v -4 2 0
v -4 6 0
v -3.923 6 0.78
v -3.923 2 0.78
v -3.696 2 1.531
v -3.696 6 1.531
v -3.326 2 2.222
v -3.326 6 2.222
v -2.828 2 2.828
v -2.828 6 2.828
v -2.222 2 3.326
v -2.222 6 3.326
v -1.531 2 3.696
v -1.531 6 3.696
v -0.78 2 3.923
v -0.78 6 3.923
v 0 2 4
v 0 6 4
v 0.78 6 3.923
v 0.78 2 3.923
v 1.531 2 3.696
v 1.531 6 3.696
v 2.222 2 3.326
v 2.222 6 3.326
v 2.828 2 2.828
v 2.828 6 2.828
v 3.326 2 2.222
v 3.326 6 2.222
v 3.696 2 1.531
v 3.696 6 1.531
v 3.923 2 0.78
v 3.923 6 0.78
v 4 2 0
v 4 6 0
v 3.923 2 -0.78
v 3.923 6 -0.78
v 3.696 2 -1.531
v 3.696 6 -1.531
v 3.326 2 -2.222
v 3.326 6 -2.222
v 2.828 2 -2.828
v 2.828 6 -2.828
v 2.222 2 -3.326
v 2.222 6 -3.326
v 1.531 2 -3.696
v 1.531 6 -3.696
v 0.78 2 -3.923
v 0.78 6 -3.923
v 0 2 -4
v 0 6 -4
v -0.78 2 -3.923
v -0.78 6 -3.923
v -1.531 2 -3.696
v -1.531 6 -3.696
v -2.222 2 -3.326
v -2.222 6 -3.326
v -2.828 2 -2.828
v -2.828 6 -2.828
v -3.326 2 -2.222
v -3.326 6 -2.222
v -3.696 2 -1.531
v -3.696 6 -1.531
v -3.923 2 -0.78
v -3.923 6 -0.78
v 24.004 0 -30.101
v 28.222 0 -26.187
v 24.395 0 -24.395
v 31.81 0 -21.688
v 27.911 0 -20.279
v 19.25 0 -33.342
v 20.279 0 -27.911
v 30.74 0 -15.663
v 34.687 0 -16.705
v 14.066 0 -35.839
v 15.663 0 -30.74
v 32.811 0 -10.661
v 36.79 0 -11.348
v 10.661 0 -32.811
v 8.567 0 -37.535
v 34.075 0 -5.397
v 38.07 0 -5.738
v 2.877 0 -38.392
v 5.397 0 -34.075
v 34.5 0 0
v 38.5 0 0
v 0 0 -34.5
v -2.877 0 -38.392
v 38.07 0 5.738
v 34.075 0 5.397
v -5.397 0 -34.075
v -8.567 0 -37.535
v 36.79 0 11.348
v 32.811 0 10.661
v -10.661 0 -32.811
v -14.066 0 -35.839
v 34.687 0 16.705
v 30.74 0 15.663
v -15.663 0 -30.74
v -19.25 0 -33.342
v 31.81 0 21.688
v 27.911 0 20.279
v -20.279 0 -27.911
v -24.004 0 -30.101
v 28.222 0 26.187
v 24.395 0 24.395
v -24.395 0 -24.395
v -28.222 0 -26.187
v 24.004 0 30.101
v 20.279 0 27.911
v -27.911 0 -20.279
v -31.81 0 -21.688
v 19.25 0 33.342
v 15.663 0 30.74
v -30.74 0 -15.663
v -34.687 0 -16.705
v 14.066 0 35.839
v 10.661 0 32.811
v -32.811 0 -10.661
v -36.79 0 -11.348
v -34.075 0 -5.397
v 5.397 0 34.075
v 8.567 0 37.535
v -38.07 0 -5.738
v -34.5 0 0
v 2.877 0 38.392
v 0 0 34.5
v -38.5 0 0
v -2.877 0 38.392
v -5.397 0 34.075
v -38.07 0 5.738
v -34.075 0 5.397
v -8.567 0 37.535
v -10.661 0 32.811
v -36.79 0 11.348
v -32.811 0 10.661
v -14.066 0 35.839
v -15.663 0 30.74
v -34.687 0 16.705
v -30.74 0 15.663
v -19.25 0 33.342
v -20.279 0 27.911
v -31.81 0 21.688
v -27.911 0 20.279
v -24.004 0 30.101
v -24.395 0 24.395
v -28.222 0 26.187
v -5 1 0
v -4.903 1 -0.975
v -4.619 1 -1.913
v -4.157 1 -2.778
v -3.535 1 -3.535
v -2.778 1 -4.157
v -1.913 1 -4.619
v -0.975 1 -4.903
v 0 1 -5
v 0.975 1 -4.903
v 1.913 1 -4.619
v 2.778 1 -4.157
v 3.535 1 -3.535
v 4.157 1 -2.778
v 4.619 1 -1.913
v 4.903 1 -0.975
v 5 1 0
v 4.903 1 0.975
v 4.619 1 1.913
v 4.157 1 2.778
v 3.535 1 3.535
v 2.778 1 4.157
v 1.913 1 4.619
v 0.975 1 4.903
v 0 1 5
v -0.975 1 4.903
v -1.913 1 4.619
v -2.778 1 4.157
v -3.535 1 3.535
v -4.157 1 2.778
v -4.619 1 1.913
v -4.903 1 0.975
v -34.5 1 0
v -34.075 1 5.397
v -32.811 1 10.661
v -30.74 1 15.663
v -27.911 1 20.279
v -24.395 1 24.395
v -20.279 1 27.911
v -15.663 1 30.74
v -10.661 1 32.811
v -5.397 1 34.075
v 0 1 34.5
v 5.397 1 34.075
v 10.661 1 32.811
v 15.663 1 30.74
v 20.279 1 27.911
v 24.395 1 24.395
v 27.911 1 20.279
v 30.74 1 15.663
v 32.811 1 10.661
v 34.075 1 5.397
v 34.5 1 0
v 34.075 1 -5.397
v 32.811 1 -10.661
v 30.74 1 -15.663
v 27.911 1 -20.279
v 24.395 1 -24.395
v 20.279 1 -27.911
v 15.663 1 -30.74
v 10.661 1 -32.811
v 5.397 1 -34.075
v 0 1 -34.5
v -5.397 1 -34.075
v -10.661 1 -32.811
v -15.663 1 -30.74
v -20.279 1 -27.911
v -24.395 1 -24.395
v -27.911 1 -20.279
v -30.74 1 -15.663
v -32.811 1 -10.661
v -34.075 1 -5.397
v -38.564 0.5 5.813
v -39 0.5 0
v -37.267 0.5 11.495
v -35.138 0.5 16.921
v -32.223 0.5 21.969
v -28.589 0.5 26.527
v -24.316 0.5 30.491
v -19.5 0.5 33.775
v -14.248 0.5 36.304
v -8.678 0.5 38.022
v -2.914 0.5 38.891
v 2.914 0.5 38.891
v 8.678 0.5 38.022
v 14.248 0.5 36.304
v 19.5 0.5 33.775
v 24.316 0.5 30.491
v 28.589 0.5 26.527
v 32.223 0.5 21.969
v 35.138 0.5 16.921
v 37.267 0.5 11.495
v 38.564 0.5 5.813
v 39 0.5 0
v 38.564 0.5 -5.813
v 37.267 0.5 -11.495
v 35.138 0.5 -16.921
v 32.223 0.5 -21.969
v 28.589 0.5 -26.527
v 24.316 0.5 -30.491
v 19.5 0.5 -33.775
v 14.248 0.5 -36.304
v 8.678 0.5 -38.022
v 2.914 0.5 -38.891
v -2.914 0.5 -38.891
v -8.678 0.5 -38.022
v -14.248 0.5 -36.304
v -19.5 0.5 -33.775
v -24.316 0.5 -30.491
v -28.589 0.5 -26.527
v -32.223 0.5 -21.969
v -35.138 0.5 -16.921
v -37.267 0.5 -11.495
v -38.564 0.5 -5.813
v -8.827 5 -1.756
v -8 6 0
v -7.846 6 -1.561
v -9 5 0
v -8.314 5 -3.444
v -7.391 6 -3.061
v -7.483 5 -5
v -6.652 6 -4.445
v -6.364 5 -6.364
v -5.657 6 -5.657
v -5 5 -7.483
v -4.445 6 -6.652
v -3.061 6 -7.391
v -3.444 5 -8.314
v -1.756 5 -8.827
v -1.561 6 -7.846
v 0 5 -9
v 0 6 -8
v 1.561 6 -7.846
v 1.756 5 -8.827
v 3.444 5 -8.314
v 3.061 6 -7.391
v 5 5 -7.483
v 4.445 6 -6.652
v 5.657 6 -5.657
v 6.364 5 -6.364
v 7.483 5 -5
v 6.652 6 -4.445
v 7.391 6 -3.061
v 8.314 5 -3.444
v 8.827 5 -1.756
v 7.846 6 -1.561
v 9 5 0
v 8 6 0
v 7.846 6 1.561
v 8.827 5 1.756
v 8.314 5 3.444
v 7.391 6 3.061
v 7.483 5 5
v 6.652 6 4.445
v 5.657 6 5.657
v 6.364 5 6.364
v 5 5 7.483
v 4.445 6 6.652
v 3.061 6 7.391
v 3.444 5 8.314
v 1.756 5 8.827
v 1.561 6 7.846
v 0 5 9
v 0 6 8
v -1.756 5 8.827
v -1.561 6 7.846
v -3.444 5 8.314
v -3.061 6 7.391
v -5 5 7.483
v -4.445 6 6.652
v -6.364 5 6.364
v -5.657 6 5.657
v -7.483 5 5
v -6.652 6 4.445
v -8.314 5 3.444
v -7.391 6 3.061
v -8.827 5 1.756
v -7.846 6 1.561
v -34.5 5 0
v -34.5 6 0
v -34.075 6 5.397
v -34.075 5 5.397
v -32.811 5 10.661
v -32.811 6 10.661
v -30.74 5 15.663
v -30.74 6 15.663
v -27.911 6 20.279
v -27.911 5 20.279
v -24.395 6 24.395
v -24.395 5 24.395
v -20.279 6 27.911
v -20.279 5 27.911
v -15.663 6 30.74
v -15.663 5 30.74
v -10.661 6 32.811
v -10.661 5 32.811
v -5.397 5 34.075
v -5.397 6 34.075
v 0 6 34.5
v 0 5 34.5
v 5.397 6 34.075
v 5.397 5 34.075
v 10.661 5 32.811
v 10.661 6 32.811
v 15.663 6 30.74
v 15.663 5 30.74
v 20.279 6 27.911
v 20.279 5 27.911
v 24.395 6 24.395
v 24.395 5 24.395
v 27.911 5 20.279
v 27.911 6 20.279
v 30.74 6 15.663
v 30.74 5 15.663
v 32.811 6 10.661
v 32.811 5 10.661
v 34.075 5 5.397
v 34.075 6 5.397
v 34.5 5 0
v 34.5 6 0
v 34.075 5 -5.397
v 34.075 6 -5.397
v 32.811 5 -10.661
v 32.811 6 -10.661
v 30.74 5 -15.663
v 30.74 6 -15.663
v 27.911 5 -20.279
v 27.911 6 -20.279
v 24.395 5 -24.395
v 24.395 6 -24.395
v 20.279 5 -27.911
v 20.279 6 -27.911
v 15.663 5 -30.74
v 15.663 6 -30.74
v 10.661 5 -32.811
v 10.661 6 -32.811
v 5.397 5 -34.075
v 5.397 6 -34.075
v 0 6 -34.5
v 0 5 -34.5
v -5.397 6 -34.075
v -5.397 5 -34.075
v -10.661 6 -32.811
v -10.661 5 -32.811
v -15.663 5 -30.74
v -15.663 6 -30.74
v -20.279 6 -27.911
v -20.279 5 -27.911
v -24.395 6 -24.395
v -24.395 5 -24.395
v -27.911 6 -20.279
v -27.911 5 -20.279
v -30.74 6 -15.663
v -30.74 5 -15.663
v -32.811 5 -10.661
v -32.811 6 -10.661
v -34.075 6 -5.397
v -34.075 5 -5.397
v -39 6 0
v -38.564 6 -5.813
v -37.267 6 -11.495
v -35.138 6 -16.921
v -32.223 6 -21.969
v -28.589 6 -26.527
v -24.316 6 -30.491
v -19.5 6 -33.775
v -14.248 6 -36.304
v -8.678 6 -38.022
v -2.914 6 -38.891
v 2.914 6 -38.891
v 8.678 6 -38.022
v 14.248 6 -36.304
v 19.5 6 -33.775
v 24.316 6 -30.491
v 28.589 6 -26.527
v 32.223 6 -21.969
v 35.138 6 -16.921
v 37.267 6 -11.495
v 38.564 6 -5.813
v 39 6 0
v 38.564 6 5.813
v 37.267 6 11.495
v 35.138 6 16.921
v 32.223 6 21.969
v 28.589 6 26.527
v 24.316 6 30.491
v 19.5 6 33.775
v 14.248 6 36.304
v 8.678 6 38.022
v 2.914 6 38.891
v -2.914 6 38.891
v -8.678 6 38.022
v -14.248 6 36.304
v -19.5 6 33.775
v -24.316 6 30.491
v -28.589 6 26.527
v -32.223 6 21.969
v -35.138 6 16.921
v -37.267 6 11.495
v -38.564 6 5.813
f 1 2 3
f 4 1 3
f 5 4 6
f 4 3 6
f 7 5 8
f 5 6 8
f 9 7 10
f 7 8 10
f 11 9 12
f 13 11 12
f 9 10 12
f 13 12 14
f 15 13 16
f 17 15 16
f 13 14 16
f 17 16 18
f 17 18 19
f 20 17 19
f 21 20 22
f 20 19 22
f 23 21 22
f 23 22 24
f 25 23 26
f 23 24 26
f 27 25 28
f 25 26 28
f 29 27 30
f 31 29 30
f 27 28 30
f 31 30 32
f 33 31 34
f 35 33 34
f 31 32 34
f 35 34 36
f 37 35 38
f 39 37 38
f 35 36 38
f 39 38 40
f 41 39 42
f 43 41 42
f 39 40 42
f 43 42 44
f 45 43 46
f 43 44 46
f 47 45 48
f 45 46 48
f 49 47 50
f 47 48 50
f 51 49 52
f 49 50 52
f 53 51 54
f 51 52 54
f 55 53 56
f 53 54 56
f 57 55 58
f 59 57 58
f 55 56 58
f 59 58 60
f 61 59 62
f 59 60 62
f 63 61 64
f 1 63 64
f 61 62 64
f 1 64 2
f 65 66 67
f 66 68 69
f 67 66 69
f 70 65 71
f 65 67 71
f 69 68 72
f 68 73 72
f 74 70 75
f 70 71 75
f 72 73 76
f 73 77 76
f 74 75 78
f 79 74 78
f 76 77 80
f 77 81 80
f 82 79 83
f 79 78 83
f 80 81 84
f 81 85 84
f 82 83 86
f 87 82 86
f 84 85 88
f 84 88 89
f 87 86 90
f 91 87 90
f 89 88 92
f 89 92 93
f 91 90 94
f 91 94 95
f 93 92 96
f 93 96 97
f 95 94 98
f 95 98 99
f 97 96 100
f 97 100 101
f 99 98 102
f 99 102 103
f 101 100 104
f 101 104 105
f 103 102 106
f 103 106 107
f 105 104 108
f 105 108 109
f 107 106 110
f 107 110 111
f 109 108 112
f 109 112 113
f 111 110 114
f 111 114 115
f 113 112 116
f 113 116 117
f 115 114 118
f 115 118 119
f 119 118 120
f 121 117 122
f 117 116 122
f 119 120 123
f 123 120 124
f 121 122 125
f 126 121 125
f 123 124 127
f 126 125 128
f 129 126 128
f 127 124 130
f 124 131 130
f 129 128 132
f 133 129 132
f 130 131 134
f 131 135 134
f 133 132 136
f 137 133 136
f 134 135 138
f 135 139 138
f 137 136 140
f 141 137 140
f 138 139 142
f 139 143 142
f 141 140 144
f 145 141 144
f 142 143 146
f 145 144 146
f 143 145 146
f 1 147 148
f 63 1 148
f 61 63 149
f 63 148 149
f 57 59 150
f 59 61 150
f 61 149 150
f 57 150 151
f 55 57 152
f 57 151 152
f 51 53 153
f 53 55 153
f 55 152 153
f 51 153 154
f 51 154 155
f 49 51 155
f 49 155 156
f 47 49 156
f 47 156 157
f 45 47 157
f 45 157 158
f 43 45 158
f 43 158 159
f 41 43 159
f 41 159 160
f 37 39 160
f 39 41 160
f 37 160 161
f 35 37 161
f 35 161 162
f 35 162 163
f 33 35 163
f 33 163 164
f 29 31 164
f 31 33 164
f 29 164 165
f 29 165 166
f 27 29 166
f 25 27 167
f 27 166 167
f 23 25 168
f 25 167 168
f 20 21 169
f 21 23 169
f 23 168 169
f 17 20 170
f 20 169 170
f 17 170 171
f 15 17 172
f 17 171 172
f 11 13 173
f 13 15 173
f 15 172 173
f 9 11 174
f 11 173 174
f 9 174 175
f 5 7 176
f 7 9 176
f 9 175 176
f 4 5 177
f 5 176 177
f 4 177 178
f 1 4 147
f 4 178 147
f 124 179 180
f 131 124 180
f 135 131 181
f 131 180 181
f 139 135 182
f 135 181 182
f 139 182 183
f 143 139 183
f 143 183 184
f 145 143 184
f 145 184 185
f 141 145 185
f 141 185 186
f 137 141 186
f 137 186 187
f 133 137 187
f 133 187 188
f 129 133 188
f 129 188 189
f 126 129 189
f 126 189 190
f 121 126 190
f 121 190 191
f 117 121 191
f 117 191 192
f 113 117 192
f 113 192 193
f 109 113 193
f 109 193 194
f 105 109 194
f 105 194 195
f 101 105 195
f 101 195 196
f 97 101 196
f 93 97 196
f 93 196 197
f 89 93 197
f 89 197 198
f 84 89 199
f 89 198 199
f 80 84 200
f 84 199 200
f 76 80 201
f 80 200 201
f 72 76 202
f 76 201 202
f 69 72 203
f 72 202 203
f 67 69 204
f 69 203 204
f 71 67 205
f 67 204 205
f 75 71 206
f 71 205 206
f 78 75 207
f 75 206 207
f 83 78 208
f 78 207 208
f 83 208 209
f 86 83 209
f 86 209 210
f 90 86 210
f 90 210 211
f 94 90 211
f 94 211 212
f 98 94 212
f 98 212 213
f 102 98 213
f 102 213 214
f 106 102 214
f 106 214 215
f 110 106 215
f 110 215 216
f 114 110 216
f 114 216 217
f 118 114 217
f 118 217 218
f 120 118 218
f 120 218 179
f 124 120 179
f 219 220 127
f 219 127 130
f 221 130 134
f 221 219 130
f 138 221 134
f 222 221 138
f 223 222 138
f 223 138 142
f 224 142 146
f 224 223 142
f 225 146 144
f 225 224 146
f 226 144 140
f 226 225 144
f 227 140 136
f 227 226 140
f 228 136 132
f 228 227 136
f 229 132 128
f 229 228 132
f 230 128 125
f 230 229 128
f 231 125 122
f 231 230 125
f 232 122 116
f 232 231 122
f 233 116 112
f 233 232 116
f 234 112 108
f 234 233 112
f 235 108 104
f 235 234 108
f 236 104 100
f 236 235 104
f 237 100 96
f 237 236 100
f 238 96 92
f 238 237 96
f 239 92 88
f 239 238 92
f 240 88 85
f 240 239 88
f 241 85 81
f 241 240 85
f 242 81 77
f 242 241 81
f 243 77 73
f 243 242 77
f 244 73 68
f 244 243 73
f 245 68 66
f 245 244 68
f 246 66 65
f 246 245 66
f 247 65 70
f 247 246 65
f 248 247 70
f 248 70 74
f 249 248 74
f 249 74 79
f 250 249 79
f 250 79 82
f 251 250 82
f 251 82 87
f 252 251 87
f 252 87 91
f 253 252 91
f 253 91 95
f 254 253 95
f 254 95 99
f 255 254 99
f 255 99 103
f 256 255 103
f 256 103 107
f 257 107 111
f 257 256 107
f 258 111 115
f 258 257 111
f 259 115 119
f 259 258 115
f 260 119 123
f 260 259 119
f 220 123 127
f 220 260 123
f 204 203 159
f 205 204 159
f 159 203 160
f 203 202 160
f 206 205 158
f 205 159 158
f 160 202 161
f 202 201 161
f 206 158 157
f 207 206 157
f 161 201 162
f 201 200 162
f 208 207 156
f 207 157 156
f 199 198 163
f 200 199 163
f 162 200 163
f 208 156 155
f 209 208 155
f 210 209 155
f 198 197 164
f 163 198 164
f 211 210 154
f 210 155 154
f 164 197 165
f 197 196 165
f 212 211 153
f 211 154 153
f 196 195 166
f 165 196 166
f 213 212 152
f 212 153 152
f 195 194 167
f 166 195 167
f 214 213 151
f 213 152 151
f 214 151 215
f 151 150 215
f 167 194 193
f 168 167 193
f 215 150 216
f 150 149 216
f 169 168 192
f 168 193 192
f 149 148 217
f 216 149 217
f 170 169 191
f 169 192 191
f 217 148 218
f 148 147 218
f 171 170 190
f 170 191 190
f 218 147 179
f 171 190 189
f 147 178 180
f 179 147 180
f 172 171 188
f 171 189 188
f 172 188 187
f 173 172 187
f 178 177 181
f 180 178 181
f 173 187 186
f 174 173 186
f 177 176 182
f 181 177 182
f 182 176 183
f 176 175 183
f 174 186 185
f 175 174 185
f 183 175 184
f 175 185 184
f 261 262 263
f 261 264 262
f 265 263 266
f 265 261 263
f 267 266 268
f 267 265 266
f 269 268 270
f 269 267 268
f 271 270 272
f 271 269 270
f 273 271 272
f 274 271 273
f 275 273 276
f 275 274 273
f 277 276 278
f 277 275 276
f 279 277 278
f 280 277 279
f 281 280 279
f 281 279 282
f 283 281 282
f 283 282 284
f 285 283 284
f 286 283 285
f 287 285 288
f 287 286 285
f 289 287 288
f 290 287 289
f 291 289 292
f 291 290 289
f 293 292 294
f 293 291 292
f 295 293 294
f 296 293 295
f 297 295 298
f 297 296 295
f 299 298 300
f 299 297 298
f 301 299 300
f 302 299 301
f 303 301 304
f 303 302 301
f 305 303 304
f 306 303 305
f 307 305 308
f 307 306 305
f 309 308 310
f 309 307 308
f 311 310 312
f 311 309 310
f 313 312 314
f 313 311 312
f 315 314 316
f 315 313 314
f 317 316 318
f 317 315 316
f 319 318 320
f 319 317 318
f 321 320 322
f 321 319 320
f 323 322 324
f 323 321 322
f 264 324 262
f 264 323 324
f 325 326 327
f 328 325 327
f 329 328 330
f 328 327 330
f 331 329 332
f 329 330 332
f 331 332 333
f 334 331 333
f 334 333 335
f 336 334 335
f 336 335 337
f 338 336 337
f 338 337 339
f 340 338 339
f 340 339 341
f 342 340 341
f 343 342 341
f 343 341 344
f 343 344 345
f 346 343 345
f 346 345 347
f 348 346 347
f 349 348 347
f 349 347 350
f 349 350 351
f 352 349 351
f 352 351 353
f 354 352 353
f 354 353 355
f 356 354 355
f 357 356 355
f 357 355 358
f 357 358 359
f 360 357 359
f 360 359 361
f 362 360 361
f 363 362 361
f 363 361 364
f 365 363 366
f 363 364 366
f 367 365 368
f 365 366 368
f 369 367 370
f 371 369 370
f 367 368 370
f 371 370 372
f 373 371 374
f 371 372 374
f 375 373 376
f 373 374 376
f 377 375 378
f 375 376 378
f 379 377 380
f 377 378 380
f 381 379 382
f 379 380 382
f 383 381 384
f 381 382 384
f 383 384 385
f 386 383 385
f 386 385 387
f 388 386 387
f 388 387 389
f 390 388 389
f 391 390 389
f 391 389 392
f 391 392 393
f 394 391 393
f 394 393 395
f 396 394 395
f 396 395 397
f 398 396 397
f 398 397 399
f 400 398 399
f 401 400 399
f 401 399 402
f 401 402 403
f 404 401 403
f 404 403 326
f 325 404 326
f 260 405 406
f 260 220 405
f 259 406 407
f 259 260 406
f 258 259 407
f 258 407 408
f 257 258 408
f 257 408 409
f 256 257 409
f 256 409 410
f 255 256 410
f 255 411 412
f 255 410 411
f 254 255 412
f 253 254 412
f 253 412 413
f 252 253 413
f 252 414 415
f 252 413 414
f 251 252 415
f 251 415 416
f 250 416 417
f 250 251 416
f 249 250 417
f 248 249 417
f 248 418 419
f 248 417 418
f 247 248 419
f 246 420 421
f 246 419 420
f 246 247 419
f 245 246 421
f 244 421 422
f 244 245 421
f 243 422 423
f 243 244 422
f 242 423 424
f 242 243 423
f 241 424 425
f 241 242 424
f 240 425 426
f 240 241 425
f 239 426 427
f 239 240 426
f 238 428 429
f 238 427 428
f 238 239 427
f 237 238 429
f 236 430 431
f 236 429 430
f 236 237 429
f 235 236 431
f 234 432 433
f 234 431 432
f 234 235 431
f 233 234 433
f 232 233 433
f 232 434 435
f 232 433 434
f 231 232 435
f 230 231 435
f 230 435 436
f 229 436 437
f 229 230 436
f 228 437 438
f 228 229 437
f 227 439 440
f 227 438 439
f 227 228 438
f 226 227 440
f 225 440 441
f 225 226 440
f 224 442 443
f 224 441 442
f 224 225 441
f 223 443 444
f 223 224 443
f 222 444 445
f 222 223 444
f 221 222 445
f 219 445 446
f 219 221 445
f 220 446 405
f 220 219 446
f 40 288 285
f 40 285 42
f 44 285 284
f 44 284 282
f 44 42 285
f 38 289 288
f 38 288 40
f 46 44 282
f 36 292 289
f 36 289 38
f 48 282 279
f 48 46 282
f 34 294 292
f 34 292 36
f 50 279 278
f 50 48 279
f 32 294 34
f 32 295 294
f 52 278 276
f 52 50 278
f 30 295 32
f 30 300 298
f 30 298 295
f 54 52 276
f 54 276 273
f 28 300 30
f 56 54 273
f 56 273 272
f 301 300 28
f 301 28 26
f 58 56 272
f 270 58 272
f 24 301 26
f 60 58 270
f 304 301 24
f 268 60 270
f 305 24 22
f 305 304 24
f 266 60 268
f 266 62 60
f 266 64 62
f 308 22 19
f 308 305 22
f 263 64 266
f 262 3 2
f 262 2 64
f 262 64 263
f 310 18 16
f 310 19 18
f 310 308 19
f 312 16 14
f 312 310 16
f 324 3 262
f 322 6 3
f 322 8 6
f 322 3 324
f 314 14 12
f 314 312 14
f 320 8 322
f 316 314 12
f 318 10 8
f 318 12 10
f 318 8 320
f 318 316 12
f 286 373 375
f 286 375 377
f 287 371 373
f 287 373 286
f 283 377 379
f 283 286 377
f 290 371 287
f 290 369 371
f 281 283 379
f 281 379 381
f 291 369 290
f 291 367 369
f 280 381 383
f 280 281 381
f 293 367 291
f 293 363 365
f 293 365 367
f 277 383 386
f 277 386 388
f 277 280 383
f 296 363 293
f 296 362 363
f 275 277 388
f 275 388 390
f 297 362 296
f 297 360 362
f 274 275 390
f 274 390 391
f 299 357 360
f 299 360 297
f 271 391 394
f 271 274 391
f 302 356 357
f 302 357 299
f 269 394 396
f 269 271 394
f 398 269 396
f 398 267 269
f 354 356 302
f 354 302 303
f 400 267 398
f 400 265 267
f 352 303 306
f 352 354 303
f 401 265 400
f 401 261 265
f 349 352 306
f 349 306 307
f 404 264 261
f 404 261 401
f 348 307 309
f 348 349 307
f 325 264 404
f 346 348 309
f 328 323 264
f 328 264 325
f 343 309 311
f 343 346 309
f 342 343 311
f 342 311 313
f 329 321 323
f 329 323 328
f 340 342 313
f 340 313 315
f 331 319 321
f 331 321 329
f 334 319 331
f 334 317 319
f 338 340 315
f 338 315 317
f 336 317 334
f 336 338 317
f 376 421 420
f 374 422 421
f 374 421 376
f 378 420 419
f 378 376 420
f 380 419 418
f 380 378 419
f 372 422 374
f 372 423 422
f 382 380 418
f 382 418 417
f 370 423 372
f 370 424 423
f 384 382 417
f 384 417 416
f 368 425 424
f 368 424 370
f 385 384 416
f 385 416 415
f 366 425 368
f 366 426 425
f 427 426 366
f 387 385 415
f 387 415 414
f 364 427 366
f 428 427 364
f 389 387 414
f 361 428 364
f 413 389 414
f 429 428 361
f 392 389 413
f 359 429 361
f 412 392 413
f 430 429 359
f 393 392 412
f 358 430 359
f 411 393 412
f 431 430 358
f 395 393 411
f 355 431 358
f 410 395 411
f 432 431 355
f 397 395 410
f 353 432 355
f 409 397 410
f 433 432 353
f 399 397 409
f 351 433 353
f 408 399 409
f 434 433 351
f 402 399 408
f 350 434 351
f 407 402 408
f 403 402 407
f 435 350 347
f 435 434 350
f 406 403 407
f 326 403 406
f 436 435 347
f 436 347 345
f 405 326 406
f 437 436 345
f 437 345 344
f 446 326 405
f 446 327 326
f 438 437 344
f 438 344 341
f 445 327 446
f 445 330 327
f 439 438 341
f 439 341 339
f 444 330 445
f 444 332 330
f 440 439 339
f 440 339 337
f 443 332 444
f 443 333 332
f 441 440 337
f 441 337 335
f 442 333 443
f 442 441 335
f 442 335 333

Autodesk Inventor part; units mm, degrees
ref_plane "YZ Plane" through (0, 0, 0) normal (1, 0, 0) x (0, 1, 0)
ref_plane "XZ Plane" through (0, 0, 0) normal (0, 1, 0) x (-1, 0, 0)
ref_plane "XY Plane" through (0, 0, 0) normal (0, 0, 1) x (1, 0, 0)
sketch "Sketch1" plane through (0, 0, 0) normal (0, 0, 1) x (1, 0, 0)
  line L0 (-39, 0) -> (-34.5, 0)
  line L1 (-34.5, 0) -> (-34.5, 1)
  line L2 (-34.5, 1) -> (-4, 1)
  line L3 (-4, 1) -> (-4, 6)
  line L4 (-4, 6) -> (-8, 6)
  line L5 (-8, 6) -> (-8, 5)
  line L6 (-8, 5) -> (-34.5, 5)
  line L7 (-34.5, 5) -> (-34.5, 6)
  line L8 (-34.5, 6) -> (-39, 6)
  line L9 (-39, 6) -> (-39, 0)
  line L10 (0, 0) -> (0, 3.3453)
  line L11 (-34.5, 1) -> (-34.5, 1.25)
  line L12 (-34.5, 1.25) -> (-32.5, 1)
  dimension "d0" = 8
  dimension "d3" = 16
  dimension "d8" = 1
  dimension "d9" = 1
  dimension "d10" = 4
  dimension "d11" = 78
  dimension "d18" = 69
  dimension "d23" = 0.25
  dimension "d24" = 2
revolve "Revolution1" add sketch "Sketch1" angle 360 about axis through (0, 0, 0) along (0, 1, 0)
chamfer "Chamfer1" distance 1 angle 45 2 edges at (4, 1, 0) (8, 5, 0)
chamfer "Chamfer2" distance 0.5 angle 45 1 edges at (39, 0, 0)
properties part number "009" material "Stainless Steel, 440C"
